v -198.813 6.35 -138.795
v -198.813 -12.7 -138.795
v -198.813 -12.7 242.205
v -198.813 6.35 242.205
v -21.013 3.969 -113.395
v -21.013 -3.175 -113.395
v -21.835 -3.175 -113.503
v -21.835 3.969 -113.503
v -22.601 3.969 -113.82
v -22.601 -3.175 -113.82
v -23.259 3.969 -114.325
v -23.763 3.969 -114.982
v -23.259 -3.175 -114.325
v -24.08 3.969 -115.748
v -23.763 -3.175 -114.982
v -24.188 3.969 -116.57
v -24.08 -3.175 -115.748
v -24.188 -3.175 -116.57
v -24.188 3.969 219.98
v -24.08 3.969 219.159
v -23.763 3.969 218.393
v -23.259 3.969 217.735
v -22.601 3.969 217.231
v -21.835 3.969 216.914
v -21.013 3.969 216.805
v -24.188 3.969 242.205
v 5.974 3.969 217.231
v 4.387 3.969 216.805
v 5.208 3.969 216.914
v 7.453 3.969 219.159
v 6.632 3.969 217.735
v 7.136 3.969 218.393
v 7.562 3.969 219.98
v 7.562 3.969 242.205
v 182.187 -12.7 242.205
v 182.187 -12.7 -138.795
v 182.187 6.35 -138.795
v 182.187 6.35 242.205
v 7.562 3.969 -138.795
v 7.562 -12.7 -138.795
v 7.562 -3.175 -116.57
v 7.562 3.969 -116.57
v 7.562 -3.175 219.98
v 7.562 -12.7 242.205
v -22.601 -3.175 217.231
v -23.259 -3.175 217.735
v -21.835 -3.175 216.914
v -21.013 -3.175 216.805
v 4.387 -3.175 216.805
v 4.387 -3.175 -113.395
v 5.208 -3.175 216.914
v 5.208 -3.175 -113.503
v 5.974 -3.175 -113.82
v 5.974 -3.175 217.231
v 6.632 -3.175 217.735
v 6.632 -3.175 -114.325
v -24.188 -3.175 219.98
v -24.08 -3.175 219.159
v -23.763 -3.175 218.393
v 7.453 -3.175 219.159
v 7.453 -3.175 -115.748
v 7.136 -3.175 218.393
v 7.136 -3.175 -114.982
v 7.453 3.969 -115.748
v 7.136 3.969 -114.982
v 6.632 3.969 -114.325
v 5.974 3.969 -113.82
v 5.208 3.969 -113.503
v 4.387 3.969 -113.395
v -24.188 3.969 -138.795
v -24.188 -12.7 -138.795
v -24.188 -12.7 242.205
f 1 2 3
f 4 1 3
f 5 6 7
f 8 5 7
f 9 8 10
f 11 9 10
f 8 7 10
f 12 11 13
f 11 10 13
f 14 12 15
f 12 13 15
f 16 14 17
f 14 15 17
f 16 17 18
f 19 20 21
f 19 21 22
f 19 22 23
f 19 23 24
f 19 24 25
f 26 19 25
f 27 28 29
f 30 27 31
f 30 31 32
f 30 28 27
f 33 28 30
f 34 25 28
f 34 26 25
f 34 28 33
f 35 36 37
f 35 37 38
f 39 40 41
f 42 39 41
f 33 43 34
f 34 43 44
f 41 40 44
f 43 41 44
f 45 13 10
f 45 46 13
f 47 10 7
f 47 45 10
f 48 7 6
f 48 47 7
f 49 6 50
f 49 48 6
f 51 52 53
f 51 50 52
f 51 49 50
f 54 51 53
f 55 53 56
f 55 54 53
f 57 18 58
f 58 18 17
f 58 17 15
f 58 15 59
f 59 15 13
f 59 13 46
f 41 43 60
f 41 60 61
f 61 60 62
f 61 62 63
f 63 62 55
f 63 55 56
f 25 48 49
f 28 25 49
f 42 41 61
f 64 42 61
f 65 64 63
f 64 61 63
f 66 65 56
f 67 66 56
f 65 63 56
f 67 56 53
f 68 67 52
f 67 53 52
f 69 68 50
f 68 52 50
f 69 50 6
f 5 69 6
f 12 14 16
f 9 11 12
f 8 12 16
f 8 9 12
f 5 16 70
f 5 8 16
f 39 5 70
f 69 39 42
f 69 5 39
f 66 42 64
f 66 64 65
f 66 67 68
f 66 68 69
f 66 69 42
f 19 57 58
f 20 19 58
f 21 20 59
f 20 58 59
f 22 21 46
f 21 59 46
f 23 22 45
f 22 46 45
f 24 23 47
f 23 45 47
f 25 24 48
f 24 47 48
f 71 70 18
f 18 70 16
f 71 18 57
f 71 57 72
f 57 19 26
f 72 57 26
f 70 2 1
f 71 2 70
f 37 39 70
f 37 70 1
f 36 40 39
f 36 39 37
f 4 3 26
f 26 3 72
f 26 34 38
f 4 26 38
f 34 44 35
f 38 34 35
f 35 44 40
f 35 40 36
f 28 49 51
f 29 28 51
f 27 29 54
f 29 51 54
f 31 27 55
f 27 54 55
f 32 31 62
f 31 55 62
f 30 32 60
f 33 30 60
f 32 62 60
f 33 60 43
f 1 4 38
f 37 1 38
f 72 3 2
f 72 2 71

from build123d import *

# Parameters (mm, degrees)
F0_W     = 174.625
F0_H     = 381
F1_DEPTH = 12.7
F0_W_2   = 31.75
F2_DEPTH = 3.175
F4_W     = 381
F4_H     = 381
F5_DEPTH = 6.35
F6_DEPTH = 16.66875


with BuildPart() as f1:
    # F0 (on Front) → F1 (new body)
    with BuildSketch(Plane.XZ):
        with Locations((-111.50095, 51.705398)):
            Rectangle(F0_W, F0_H)
        with Locations((94.87405, 51.705398)):
            Rectangle(F0_W, F0_H)
    extrude(amount=F1_DEPTH)

    # F0 (on Front) → F2 (join)
    with BuildSketch(Plane.XZ):
        with Locations((-8.31345, 51.705398)):
            Rectangle(F0_W_2, F0_H)
    extrude(amount=F2_DEPTH)

    # F4 (on face) → F5 (join)
    with BuildSketch(Plane.XZ):
        with Locations((-8.31345, 51.705398)):
            Rectangle(F4_W, F4_H)
    extrude(amount=-F5_DEPTH)

    # F3 (on face) → F6 (cut)
    with BuildSketch(Plane.XZ.offset(12.7)):
        with BuildLine():
            Line((-24.18845, -116.569602), (-24.18845, -138.794602))
            Line((-24.18845, -138.794602), (7.56155, -138.794602))
            Line((7.56155, -138.794602), (7.56155, -116.569602))
            ThreePointArc((7.56155, -116.569602), (6.631614, -114.324538), (4.38655, -113.394602))
            Line((4.38655, -113.394602), (-21.01345, -113.394602))
            ThreePointArc((-21.01345, -113.394602), (-23.258514, -114.324538), (-24.18845, -116.569602))
        make_face()
        with BuildLine():
            ThreePointArc((-24.18845, 219.980398), (-23.258514, 217.735334), (-21.01345, 216.805398))
            Line((-21.01345, 216.805398), (4.38655, 216.805398))
            ThreePointArc((4.38655, 216.805398), (6.631614, 217.735334), (7.56155, 219.980398))
            Line((7.56155, 219.980398), (7.56155, 242.205398))
            Line((7.56155, 242.205398), (-24.18845, 242.205398))
            Line((-24.18845, 242.205398), (-24.18845, 219.980398))
        make_face()
    extrude(amount=-F6_DEPTH, mode=Mode.SUBTRACT)


solid = f1.part
